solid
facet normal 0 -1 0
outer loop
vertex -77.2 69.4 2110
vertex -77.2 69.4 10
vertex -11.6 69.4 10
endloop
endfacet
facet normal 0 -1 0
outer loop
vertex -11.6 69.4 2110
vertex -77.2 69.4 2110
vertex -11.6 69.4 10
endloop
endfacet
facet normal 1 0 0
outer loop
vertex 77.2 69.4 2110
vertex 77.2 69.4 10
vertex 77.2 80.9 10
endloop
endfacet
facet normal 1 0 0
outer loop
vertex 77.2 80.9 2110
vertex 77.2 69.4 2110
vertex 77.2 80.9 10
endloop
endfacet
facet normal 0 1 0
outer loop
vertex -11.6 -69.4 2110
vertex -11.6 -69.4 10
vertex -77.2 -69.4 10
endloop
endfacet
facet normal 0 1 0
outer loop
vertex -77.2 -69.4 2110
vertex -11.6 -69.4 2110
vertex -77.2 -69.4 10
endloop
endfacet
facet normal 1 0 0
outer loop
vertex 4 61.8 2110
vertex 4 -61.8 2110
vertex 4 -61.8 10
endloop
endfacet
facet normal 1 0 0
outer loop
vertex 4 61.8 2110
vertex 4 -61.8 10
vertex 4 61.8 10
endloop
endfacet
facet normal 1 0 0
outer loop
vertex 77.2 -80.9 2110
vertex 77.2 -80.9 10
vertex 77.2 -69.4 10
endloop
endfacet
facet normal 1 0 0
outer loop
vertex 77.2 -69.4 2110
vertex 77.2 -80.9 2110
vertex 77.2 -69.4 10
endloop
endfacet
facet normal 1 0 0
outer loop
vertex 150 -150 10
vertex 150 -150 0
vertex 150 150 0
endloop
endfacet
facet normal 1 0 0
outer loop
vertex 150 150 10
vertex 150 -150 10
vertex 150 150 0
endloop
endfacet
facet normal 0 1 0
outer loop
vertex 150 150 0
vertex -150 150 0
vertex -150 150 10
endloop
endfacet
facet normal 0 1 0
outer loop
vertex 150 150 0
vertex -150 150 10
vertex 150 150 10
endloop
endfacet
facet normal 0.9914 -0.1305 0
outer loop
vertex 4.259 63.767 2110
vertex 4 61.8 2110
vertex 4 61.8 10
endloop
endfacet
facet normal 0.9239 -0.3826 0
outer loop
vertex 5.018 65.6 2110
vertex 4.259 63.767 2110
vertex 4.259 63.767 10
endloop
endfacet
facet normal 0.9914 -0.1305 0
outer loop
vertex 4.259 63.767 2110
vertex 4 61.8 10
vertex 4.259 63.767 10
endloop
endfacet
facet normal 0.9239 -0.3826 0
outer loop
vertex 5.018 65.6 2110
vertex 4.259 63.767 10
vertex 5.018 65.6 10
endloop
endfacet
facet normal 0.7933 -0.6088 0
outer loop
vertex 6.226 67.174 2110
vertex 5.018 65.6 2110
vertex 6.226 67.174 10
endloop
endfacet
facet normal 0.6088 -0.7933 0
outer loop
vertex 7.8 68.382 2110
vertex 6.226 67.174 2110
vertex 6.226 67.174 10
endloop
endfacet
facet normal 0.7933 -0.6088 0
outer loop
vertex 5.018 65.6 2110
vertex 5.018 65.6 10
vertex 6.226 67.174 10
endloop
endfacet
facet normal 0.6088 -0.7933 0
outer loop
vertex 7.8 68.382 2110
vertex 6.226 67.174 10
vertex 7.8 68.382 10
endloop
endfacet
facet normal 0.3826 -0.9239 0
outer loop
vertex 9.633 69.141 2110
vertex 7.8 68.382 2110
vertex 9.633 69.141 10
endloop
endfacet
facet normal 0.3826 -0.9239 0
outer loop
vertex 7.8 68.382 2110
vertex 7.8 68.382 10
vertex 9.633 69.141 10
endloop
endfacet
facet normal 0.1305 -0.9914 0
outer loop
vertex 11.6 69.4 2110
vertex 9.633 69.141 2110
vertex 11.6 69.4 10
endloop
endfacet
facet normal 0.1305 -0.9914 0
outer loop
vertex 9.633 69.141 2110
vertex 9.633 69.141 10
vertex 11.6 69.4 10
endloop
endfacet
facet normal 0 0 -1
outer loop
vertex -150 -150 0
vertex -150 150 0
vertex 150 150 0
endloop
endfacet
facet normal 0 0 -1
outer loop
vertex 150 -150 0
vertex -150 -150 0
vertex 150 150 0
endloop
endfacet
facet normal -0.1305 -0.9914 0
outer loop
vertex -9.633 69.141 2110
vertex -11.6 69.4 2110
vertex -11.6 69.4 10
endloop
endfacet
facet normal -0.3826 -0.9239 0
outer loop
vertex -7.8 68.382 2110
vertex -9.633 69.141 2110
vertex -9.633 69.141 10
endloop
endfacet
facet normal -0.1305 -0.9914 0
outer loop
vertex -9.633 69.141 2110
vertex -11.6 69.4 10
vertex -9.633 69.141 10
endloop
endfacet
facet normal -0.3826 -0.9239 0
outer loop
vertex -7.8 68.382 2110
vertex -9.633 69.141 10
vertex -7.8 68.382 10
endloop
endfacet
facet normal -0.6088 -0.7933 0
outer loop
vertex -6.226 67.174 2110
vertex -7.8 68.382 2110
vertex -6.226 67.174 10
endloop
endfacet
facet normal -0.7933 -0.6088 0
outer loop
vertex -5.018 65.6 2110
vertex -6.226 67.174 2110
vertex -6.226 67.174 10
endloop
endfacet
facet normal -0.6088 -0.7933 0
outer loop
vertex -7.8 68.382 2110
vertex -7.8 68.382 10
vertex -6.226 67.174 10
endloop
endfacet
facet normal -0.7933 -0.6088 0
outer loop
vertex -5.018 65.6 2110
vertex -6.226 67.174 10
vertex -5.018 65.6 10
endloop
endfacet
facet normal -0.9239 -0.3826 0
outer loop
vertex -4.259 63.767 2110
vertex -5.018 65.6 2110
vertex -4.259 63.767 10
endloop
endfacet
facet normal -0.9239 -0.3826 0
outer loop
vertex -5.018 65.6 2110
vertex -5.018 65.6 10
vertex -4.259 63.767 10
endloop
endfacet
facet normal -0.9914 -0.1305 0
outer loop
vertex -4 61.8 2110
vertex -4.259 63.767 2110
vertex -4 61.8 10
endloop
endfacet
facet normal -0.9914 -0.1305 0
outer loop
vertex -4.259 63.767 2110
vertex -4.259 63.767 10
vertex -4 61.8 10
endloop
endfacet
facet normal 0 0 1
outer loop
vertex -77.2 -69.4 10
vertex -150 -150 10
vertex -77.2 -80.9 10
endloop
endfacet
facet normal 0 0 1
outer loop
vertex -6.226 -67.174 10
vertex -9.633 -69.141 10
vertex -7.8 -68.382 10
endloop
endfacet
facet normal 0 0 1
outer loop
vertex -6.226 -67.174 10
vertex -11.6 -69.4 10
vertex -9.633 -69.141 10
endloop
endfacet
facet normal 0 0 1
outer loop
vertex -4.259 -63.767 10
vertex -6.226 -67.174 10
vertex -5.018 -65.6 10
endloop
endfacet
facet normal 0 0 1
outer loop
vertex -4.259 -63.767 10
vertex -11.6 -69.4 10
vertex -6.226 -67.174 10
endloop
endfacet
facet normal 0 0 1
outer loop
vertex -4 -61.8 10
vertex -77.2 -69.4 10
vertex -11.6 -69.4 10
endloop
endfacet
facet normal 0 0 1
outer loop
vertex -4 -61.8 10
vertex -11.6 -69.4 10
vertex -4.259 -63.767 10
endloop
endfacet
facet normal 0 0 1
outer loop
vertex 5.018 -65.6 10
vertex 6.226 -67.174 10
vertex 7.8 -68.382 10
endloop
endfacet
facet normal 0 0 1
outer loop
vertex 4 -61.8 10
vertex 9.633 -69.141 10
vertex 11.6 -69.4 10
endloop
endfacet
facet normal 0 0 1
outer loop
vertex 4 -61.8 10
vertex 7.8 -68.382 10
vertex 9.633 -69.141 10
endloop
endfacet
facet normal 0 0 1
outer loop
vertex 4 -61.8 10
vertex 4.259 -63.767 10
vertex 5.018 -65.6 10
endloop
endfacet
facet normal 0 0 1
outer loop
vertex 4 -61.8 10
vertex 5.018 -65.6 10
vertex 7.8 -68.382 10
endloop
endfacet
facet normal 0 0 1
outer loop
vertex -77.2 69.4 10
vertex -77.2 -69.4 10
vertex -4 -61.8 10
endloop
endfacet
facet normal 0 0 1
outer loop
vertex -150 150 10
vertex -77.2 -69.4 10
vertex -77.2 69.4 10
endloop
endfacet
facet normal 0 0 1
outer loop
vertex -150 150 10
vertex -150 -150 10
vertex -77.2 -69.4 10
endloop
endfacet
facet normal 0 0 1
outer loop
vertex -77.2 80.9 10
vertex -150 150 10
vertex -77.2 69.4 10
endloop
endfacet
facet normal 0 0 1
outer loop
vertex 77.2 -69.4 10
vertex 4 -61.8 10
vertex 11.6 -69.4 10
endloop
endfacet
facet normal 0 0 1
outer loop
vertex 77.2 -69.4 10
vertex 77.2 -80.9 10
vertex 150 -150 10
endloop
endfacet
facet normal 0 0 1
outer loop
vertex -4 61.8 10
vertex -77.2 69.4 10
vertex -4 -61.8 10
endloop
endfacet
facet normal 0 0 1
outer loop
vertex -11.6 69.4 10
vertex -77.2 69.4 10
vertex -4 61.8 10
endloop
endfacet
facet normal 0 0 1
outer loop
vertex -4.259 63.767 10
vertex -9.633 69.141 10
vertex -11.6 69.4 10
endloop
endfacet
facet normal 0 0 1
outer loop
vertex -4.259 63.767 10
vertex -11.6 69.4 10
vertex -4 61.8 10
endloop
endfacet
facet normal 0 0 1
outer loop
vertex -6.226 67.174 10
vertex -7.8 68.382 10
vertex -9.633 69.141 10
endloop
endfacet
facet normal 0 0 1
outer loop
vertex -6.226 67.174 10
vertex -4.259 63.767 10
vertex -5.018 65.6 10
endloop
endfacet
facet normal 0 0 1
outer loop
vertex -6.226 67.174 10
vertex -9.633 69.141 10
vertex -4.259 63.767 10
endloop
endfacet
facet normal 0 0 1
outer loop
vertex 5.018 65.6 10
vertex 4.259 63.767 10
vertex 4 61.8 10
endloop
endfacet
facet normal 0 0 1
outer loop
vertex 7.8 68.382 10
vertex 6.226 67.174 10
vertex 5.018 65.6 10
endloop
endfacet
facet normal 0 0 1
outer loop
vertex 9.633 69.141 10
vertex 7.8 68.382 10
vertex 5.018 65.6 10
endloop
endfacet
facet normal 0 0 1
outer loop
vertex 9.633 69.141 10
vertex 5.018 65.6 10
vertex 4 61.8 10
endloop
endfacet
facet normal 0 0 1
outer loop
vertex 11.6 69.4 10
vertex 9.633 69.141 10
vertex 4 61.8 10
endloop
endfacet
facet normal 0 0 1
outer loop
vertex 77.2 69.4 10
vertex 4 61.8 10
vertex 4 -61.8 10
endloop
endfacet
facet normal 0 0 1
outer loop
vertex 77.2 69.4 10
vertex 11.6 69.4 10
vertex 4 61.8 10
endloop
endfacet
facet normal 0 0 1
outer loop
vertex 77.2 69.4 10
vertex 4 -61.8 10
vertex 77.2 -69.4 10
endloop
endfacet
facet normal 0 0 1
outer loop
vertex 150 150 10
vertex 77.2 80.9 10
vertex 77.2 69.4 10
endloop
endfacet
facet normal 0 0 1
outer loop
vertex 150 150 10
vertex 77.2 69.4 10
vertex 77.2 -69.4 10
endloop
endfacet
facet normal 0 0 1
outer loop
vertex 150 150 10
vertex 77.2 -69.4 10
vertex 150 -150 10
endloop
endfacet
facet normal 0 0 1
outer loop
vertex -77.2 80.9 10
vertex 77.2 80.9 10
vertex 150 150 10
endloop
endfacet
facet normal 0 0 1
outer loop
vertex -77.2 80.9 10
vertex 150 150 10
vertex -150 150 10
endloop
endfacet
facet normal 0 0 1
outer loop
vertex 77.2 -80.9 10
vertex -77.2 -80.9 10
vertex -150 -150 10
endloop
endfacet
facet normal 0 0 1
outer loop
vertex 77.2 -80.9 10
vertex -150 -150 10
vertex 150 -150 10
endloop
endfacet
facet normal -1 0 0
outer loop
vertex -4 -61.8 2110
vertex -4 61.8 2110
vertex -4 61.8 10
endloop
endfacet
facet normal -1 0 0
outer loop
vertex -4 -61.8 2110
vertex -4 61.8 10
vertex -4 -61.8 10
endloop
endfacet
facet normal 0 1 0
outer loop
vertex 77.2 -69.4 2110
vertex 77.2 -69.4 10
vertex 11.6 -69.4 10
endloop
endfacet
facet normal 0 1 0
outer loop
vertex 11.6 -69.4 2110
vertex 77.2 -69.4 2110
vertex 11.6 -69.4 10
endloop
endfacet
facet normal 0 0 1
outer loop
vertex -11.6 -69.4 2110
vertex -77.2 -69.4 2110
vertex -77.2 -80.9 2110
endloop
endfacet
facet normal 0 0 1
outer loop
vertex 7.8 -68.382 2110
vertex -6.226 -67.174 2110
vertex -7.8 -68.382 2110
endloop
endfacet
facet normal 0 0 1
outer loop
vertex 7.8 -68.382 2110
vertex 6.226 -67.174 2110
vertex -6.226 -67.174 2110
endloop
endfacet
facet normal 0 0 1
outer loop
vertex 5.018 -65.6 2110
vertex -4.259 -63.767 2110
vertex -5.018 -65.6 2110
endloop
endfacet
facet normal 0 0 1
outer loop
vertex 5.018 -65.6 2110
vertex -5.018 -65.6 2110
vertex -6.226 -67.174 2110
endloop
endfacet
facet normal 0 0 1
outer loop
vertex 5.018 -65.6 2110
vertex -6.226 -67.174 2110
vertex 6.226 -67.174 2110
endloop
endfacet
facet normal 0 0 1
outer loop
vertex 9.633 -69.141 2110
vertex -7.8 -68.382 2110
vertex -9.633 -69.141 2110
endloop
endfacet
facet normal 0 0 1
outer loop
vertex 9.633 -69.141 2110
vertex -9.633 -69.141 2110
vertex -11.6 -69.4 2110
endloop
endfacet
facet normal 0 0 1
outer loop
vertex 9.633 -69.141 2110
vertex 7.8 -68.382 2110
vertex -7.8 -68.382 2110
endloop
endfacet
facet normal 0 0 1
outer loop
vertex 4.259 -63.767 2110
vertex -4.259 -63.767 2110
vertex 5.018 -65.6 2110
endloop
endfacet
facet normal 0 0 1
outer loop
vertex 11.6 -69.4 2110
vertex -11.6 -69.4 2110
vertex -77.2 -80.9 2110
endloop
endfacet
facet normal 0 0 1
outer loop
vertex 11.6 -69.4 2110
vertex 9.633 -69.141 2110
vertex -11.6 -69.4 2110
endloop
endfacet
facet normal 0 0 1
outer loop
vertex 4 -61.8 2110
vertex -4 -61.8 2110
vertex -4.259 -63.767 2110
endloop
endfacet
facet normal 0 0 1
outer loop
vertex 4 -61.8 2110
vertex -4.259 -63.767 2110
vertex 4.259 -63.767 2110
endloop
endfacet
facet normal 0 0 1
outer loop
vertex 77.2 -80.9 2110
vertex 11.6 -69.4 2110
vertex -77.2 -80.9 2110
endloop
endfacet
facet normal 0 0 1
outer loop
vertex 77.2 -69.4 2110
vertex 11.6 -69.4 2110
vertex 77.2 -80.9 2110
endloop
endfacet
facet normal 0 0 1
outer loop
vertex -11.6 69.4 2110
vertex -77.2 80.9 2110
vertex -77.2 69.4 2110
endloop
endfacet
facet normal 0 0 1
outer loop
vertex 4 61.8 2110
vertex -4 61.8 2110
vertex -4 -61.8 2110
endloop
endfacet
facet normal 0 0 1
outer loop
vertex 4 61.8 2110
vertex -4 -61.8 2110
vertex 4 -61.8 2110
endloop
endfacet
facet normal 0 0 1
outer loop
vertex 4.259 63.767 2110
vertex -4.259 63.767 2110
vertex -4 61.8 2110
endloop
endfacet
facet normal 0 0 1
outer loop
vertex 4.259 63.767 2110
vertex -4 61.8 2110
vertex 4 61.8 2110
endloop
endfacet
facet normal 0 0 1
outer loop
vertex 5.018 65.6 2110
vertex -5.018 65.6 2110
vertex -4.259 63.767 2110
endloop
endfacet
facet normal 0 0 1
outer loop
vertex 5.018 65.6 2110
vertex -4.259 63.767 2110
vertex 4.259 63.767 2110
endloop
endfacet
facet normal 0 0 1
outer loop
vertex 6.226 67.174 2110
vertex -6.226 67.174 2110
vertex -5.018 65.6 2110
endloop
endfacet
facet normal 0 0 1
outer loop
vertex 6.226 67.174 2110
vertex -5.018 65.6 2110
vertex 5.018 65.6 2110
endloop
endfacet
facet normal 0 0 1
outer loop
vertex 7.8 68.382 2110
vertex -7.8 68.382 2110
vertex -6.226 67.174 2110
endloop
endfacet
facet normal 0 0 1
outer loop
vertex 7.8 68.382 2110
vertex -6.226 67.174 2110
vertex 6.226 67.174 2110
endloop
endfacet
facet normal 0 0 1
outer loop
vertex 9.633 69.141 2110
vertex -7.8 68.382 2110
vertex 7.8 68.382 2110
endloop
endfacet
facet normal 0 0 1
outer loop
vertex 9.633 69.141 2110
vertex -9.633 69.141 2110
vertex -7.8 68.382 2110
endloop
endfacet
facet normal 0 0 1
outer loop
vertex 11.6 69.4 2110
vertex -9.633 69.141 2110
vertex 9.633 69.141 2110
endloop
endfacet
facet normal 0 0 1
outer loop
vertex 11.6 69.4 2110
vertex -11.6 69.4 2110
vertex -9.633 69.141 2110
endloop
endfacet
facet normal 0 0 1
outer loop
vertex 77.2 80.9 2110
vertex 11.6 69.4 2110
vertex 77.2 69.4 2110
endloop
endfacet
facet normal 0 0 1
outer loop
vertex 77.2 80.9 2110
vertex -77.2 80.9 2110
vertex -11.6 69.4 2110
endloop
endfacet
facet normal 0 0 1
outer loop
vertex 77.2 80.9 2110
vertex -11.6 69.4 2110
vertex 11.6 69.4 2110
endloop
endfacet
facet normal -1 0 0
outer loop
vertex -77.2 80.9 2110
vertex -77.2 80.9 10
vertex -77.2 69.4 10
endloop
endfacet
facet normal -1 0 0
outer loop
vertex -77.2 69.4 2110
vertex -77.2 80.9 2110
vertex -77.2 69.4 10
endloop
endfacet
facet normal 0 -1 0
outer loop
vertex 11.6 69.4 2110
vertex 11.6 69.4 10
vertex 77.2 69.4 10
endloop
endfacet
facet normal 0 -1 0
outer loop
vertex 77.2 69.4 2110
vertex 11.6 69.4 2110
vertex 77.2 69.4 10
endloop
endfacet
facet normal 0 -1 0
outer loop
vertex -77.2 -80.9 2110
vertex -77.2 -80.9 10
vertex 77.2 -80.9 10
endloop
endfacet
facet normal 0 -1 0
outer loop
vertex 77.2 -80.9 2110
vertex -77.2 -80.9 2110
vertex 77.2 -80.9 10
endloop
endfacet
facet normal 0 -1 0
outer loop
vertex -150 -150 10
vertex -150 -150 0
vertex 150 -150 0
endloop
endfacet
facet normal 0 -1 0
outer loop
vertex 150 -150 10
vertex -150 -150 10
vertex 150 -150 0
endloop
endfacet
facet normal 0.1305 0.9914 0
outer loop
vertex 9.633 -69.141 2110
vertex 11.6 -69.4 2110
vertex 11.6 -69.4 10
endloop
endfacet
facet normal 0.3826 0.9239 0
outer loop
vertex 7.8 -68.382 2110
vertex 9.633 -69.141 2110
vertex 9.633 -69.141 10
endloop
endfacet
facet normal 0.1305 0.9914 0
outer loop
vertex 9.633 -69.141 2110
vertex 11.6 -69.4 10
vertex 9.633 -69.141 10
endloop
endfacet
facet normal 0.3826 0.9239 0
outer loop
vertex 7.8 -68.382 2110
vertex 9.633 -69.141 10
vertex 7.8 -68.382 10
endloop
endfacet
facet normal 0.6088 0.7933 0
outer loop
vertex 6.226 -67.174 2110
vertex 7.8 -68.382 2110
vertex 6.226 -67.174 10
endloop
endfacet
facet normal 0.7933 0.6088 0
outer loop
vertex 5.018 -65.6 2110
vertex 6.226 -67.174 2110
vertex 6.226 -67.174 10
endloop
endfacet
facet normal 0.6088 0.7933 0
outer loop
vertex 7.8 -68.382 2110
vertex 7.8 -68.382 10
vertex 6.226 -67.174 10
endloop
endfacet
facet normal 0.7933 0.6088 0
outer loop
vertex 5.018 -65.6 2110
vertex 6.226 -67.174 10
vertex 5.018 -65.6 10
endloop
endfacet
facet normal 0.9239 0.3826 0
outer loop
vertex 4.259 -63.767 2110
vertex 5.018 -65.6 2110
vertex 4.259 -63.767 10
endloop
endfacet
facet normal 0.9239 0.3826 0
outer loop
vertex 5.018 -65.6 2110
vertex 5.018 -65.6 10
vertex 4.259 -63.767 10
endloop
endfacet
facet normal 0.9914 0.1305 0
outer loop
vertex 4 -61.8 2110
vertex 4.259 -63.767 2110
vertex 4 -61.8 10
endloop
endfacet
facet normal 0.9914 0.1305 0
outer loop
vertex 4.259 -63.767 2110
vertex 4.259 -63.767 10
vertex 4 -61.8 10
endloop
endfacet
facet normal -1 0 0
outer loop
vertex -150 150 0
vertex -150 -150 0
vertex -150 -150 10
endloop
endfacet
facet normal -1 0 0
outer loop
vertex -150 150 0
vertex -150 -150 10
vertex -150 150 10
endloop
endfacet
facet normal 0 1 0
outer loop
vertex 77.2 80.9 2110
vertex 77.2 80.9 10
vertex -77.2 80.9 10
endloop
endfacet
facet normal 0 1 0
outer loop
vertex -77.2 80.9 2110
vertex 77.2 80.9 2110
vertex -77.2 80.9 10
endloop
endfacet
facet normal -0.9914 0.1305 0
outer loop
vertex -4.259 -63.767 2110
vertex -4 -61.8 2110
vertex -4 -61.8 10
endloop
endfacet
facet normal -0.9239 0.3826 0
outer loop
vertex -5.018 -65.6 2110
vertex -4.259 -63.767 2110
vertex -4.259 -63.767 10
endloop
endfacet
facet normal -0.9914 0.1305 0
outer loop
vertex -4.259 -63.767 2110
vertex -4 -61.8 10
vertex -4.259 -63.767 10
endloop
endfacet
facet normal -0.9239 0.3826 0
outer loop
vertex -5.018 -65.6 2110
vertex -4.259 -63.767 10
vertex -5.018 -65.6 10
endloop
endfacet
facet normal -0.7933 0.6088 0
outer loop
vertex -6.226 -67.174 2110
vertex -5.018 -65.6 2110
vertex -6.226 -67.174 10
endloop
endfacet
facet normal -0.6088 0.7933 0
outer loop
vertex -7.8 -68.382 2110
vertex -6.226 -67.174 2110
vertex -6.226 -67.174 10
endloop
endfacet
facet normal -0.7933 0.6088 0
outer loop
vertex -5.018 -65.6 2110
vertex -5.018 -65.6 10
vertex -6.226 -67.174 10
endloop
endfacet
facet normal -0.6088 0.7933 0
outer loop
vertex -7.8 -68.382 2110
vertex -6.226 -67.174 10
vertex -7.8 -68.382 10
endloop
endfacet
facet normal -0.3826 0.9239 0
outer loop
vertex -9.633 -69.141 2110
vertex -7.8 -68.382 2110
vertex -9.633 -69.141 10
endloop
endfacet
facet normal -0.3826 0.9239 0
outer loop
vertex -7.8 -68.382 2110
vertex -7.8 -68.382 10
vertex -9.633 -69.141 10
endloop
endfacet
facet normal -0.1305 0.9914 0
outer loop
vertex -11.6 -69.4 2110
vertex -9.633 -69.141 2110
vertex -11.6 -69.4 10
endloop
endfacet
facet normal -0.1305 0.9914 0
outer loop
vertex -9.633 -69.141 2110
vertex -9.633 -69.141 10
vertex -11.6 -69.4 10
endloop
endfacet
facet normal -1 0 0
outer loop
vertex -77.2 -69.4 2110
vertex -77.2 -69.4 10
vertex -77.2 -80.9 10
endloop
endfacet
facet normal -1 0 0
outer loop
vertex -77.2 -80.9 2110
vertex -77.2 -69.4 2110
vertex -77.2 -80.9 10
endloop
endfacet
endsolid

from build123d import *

# Parameters (mm, degrees)
F0_W     = 300
F0_H     = 300
F1_DEPTH = 10
F3_DEPTH = 2100


with BuildPart() as f1:
    # F0 (on Top) → F1 (new body)
    with BuildSketch(Plane.XY):
        Rectangle(F0_W, F0_H)
    extrude(amount=F1_DEPTH)

    # F2 (on face) → F3 (join)
    with BuildSketch(Plane.XY.offset(10)):
        with BuildLine():
            Line((77.2, 80.9), (-77.2, 80.9))
            Line((-77.2, 80.9), (-77.2, 69.4))
            Line((-77.2, 69.4), (-11.6, 69.4))
            ThreePointArc((-11.6, 69.4), (-6.225988, 67.174012), (-4, 61.8))
            Line((-4, 61.8), (-4, -61.8))
            ThreePointArc((-4, -61.8), (-6.225988, -67.174012), (-11.6, -69.4))
            Line((-11.6, -69.4), (-77.2, -69.4))
            Line((-77.2, -69.4), (-77.2, -80.9))
            Line((-77.2, -80.9), (77.2, -80.9))
            Line((77.2, -80.9), (77.2, -69.4))
            Line((77.2, -69.4), (11.6, -69.4))
            ThreePointArc((11.6, -69.4), (6.225988, -67.174012), (4, -61.8))
            Line((4, -61.8), (4, 61.8))
            ThreePointArc((4, 61.8), (6.225988, 67.174012), (11.6, 69.4))
            Line((11.6, 69.4), (77.2, 69.4))
            Line((77.2, 69.4), (77.2, 80.9))
        make_face()
    extrude(amount=F3_DEPTH)


solid = f1.part
